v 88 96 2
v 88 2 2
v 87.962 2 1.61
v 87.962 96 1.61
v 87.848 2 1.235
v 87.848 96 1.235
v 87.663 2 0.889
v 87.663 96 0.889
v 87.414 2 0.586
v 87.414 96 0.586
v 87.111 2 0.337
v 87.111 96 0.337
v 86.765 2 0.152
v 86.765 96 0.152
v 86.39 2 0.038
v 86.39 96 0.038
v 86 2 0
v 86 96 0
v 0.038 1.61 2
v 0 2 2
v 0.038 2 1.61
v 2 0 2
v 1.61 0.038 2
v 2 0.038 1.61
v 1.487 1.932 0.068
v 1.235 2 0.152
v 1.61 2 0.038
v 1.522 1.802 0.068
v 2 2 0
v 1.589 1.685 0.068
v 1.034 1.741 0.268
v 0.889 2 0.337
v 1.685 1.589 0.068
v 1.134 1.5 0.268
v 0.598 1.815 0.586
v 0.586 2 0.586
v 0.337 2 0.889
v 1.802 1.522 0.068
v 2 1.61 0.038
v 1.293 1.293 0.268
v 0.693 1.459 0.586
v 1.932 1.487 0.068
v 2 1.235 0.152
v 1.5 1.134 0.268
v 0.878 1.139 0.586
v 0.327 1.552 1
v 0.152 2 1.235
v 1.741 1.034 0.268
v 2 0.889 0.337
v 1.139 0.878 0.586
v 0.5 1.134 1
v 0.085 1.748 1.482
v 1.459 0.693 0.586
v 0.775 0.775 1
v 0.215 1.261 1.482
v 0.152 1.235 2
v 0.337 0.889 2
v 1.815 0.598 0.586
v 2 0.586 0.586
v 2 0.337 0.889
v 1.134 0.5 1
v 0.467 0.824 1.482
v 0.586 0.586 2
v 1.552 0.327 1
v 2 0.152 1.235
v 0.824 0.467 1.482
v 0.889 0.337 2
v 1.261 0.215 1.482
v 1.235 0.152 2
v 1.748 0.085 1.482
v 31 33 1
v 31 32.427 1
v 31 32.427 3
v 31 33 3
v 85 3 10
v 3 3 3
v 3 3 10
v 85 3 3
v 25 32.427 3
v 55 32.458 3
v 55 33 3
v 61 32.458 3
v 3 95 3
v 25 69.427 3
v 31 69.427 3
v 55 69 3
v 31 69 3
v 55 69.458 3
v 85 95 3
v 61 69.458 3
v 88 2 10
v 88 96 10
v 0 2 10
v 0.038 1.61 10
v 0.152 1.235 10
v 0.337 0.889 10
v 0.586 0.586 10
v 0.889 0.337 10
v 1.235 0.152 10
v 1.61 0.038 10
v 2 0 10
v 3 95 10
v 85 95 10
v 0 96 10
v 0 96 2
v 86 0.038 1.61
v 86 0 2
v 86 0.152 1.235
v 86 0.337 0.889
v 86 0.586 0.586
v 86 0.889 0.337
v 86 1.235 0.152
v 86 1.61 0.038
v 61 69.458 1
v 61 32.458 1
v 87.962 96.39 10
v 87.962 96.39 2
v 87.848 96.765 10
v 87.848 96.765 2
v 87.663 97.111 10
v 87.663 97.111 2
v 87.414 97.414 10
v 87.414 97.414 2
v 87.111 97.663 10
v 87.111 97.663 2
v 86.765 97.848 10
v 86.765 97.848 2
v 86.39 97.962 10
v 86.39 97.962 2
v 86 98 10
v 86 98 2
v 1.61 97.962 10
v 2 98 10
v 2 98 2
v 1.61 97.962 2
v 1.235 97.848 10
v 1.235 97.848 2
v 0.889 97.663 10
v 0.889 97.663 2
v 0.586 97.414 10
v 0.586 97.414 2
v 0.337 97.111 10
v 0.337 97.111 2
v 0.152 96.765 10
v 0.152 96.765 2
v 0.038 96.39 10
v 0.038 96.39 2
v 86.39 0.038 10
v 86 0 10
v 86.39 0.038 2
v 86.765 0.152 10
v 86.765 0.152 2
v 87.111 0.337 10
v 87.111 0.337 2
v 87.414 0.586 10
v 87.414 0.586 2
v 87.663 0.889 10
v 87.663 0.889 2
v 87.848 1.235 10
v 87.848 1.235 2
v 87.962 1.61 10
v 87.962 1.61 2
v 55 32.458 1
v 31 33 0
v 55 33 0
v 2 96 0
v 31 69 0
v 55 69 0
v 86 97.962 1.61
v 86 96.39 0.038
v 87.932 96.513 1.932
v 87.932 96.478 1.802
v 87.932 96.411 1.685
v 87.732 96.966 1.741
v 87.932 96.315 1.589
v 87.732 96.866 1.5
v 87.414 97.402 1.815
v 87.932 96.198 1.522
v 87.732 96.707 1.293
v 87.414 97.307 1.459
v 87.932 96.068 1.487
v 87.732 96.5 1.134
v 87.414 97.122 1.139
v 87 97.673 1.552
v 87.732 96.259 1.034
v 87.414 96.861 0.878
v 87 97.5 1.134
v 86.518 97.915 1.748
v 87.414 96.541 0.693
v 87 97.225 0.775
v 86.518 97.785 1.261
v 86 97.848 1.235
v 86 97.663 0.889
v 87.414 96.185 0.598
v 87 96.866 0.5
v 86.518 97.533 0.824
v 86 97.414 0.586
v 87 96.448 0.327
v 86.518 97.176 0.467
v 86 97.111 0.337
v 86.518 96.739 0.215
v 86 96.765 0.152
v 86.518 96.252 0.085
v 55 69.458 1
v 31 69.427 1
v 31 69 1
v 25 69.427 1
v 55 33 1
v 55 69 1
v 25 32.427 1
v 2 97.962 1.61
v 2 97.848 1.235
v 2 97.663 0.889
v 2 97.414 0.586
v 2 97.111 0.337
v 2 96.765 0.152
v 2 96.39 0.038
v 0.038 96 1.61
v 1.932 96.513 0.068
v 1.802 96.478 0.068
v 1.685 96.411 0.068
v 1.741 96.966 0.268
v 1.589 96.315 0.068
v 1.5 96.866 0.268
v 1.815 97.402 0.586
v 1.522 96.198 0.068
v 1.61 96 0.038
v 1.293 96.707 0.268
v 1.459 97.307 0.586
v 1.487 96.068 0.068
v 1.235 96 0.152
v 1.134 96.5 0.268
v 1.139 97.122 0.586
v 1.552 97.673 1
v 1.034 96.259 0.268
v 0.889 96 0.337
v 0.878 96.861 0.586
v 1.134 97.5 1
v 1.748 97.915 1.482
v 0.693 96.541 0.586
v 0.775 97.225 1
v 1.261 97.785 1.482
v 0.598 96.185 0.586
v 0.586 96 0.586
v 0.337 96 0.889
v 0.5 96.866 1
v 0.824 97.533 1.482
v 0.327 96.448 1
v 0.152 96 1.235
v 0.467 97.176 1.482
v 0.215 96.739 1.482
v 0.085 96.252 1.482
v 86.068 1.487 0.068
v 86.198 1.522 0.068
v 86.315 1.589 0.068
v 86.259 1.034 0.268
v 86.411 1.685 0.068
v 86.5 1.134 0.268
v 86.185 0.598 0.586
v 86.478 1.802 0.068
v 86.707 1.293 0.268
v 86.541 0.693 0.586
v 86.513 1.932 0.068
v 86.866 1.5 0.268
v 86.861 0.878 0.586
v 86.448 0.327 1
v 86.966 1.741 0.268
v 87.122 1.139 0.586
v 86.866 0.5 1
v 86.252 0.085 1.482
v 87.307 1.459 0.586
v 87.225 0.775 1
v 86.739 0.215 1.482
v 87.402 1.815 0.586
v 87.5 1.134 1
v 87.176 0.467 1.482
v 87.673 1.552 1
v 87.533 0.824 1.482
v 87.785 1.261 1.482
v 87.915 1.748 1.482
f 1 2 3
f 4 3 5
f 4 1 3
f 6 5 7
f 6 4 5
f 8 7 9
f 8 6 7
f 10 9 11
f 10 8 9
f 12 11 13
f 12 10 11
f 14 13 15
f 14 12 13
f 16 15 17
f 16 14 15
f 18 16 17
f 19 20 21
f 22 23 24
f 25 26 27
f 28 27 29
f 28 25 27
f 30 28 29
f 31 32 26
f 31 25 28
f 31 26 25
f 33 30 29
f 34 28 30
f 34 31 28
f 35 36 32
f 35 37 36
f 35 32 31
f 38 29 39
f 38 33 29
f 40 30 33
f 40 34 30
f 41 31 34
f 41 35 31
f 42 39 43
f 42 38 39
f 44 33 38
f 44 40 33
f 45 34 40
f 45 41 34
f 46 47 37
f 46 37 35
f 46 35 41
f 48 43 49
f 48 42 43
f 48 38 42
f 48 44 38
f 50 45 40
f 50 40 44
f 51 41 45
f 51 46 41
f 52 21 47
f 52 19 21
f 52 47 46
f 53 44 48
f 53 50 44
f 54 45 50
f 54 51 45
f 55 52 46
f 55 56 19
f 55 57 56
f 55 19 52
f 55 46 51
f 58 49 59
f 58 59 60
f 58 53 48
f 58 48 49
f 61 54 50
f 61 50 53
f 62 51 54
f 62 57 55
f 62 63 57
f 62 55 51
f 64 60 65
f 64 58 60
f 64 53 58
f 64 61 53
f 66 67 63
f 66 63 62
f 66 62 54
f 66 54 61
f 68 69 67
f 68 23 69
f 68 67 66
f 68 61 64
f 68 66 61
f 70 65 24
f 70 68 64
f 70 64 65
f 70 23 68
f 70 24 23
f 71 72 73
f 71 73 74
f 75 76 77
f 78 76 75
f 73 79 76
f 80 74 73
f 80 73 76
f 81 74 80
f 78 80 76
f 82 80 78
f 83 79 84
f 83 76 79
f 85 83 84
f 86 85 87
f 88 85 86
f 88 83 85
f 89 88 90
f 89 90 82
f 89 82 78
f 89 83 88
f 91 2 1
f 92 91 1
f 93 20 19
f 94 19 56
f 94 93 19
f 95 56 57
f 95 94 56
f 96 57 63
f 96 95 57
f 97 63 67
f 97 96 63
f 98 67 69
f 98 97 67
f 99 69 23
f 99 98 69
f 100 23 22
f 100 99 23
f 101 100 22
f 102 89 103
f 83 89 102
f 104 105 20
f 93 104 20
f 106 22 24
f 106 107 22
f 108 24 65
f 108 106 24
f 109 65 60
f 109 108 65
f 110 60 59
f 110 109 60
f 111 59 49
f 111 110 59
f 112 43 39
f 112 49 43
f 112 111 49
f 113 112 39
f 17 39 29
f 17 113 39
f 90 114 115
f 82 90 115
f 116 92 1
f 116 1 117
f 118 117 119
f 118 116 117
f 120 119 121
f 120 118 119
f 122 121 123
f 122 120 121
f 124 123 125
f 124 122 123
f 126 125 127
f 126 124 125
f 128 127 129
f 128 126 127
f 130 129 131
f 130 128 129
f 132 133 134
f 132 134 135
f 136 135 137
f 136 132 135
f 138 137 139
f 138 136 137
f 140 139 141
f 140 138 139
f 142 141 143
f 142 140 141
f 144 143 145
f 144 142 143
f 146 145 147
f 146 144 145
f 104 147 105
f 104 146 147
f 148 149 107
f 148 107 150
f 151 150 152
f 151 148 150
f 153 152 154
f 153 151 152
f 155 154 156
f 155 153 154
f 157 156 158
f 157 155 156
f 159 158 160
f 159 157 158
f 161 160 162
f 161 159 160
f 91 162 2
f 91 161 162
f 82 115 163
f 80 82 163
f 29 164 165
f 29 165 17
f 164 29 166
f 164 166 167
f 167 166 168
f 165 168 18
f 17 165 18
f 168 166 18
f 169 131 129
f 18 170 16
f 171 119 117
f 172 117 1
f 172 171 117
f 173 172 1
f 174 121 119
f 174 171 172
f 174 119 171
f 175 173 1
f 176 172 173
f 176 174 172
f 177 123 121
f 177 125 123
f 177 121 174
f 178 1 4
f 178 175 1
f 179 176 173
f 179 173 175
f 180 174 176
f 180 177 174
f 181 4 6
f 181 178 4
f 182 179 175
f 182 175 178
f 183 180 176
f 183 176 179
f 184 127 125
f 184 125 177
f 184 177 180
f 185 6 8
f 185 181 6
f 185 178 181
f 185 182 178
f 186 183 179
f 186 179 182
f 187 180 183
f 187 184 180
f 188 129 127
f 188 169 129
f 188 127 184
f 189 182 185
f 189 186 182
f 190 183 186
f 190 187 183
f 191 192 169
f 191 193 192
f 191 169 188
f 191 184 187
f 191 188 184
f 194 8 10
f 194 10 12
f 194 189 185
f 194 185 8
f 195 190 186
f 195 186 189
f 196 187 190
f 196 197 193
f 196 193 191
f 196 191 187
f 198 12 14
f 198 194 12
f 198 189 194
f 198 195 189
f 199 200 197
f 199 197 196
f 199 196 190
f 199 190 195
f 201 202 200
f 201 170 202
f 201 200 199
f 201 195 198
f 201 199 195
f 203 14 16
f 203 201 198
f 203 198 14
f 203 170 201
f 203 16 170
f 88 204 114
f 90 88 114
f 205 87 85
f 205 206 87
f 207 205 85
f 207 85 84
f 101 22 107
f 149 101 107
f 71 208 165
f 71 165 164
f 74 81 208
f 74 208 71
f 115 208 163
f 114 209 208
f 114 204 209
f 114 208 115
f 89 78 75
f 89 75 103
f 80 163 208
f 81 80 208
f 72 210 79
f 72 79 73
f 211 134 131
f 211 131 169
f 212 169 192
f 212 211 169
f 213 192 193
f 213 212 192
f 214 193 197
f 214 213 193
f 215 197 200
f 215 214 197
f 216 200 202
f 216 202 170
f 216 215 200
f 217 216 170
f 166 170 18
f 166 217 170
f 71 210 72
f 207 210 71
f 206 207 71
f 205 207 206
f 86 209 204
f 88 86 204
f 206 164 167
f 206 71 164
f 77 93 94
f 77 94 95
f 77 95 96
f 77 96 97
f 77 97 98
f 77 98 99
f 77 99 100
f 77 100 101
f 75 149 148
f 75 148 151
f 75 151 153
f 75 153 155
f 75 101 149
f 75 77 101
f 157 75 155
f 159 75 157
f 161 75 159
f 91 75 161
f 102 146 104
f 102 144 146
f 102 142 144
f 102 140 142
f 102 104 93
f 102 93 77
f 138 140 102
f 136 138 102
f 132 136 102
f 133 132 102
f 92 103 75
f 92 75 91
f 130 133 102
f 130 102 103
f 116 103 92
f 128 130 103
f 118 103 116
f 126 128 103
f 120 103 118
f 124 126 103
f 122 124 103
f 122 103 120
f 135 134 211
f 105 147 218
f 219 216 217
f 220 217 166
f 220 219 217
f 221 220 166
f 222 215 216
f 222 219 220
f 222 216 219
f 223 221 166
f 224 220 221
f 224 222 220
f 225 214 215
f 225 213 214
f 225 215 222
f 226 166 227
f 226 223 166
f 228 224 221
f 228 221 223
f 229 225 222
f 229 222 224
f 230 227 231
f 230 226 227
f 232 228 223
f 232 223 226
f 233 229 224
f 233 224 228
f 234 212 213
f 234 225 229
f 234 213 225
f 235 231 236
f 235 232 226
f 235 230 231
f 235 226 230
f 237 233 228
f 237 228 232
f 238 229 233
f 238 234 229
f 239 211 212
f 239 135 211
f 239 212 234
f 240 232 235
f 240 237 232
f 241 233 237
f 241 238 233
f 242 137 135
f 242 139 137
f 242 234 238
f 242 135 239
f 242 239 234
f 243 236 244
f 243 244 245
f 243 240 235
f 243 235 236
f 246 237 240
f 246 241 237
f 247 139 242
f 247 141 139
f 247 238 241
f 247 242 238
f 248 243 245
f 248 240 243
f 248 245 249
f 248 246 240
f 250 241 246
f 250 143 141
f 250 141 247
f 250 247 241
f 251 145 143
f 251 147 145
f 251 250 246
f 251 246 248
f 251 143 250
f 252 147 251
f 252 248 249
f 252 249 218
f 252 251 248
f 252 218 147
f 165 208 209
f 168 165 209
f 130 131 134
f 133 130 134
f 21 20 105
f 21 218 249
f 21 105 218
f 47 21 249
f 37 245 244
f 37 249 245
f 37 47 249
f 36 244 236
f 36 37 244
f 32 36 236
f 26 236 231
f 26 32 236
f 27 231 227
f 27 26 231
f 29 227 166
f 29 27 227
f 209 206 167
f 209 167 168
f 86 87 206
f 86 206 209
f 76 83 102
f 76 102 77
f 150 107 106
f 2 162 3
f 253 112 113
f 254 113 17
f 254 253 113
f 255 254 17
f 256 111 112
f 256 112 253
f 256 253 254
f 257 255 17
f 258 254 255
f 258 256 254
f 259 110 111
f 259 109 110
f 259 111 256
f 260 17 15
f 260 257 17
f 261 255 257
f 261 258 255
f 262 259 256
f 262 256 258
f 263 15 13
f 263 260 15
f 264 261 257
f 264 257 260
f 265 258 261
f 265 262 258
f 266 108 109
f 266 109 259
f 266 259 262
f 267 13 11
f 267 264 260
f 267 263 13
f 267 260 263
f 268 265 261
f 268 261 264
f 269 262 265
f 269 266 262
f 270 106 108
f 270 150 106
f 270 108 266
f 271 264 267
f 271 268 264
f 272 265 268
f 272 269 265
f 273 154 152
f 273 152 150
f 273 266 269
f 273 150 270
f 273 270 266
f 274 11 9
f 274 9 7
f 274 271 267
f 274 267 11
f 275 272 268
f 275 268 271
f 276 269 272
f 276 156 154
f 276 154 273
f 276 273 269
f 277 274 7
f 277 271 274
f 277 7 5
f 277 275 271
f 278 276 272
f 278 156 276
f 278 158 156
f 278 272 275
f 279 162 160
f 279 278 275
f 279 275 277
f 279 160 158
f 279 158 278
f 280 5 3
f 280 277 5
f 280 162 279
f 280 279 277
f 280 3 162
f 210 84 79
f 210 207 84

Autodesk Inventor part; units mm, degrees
ref_plane "YZ Plane" through (0, 0, 0) normal (1, 0, 0) x (0, 1, 0)
ref_plane "XZ Plane" through (0, 0, 0) normal (0, 1, 0) x (-1, 0, 0)
ref_plane "XY Plane" through (0, 0, 0) normal (0, 0, 1) x (1, 0, 0)
sketch "Esquisse8" plane through (0, 0, 0) normal (0, 0, 1) x (1, 0, 0)
  line L0 (3, 3) -> (85, 3)
  line L1 (85, 3) -> (85, 95)
  line L2 (85, 95) -> (3, 95)
  line L3 (3, 95) -> (3, 3)
  line L4 (0, 0) -> (88, 0)
  line L5 (88, 0) -> (88, 98)
  line L6 (88, 98) -> (0, 98)
  line L7 (0, 98) -> (0, 0)
  dimension "d34" = 3
  dimension "d35" = 3
  dimension "d36" = 3
  dimension "d37" = 92
  dimension "d38" = 88
  dimension "d39" = 3
  dimension "d51" = 92
extrude "Extrusion5" add sketch "Esquisse8" along normal blind 10 contours L3 L2 L1 L0 | L7 L6 L5 L4
shell "Coque5" thickness 3 removed faces 1 at (58.6667, 32.6667, 10)
sketch "Esquisse9" plane through (3, 3, 3) normal (0, 0, 1) x (1, 0, 0)
  line L0 (52, 66) -> (64, 66)
  line L1 (64, 66) -> (64, 30)
  line L2 (64, 30) -> (52, 30)
  line L3 (52, 30) -> (52, 66)
  line L4 (82, 92) -> (82, 0) projected
  line L5 (0, 0) -> (82, 0) projected
  line L6 (0, 92) -> (0, 0) projected
  line L7 (52, 30) -> (28, 30)
  line L8 (28, 30) -> (28, 66)
  line L9 (28, 66) -> (52, 66)
  line L10 (52, 66) -> (52, 30)
  point P0 (-3, -3)
  dimension "d49" = 18
  dimension "d52" = 30
  dimension "d53" = 52
  dimension "d56" = 36
  dimension "d59" = 24
  dimension "d60" = 36
extrude "Extrusion6" cut sketch "Esquisse9" against normal blind 3 contours L3 L7 L8 L9
sketch "Esquisse11" plane through (3, 3, 3) normal (0, 0, 1) x (1, 0, 0)
  point P0 (-3, -3)
sketch "Esquisse12" plane through (3, 3, 3) normal (0, 0, 1) x (1, 0, 0)
  line L0 (28, 66.4268) -> (22, 66.4268)
  line L1 (22, 66.4268) -> (22, 29.4268)
  line L2 (22, 29.4268) -> (28, 29.4268)
  line L3 (28, 29.4268) -> (28, 66.4268)
  line L4 (28, 30) -> (28, 66) projected
  point P0 (-3, -3)
  dimension "d63" = 6
  dimension "d64" = 37
extrude "Extrusion7" cut sketch "Esquisse12" along normal mid plane 4
ref_plane "Plan de construction2" through (44, 3, 3) normal (1, 0, 0) x (0, 0, -1)
sketch "Esquisse13" plane through (3, 3, 3) normal (0, 0, 1) x (1, 0, 0)
  line L0 (52, 66.4584) -> (58, 66.4584)
  line L1 (58, 66.4584) -> (58, 29.4584)
  line L2 (58, 29.4584) -> (52, 29.4584)
  line L3 (52, 29.4584) -> (52, 66.4584)
  line L4 (52, 66) -> (52, 30) projected
  point P0 (-3, -3)
  dimension "d67" = 6
  dimension "d68" = 37
extrude "Extrusion8" cut sketch "Esquisse13" along normal mid plane 4
fillet "Congé2" radius 2 8 edges at (0, 0, 5) (0, 98, 5) (44, 98, 0) (88, 98, 5) (88, 0, 5) (88, 49, 0) (0, 49, 0) (44, 0, 0)
properties part number "couvercle 2" material "Plastique ABS"
